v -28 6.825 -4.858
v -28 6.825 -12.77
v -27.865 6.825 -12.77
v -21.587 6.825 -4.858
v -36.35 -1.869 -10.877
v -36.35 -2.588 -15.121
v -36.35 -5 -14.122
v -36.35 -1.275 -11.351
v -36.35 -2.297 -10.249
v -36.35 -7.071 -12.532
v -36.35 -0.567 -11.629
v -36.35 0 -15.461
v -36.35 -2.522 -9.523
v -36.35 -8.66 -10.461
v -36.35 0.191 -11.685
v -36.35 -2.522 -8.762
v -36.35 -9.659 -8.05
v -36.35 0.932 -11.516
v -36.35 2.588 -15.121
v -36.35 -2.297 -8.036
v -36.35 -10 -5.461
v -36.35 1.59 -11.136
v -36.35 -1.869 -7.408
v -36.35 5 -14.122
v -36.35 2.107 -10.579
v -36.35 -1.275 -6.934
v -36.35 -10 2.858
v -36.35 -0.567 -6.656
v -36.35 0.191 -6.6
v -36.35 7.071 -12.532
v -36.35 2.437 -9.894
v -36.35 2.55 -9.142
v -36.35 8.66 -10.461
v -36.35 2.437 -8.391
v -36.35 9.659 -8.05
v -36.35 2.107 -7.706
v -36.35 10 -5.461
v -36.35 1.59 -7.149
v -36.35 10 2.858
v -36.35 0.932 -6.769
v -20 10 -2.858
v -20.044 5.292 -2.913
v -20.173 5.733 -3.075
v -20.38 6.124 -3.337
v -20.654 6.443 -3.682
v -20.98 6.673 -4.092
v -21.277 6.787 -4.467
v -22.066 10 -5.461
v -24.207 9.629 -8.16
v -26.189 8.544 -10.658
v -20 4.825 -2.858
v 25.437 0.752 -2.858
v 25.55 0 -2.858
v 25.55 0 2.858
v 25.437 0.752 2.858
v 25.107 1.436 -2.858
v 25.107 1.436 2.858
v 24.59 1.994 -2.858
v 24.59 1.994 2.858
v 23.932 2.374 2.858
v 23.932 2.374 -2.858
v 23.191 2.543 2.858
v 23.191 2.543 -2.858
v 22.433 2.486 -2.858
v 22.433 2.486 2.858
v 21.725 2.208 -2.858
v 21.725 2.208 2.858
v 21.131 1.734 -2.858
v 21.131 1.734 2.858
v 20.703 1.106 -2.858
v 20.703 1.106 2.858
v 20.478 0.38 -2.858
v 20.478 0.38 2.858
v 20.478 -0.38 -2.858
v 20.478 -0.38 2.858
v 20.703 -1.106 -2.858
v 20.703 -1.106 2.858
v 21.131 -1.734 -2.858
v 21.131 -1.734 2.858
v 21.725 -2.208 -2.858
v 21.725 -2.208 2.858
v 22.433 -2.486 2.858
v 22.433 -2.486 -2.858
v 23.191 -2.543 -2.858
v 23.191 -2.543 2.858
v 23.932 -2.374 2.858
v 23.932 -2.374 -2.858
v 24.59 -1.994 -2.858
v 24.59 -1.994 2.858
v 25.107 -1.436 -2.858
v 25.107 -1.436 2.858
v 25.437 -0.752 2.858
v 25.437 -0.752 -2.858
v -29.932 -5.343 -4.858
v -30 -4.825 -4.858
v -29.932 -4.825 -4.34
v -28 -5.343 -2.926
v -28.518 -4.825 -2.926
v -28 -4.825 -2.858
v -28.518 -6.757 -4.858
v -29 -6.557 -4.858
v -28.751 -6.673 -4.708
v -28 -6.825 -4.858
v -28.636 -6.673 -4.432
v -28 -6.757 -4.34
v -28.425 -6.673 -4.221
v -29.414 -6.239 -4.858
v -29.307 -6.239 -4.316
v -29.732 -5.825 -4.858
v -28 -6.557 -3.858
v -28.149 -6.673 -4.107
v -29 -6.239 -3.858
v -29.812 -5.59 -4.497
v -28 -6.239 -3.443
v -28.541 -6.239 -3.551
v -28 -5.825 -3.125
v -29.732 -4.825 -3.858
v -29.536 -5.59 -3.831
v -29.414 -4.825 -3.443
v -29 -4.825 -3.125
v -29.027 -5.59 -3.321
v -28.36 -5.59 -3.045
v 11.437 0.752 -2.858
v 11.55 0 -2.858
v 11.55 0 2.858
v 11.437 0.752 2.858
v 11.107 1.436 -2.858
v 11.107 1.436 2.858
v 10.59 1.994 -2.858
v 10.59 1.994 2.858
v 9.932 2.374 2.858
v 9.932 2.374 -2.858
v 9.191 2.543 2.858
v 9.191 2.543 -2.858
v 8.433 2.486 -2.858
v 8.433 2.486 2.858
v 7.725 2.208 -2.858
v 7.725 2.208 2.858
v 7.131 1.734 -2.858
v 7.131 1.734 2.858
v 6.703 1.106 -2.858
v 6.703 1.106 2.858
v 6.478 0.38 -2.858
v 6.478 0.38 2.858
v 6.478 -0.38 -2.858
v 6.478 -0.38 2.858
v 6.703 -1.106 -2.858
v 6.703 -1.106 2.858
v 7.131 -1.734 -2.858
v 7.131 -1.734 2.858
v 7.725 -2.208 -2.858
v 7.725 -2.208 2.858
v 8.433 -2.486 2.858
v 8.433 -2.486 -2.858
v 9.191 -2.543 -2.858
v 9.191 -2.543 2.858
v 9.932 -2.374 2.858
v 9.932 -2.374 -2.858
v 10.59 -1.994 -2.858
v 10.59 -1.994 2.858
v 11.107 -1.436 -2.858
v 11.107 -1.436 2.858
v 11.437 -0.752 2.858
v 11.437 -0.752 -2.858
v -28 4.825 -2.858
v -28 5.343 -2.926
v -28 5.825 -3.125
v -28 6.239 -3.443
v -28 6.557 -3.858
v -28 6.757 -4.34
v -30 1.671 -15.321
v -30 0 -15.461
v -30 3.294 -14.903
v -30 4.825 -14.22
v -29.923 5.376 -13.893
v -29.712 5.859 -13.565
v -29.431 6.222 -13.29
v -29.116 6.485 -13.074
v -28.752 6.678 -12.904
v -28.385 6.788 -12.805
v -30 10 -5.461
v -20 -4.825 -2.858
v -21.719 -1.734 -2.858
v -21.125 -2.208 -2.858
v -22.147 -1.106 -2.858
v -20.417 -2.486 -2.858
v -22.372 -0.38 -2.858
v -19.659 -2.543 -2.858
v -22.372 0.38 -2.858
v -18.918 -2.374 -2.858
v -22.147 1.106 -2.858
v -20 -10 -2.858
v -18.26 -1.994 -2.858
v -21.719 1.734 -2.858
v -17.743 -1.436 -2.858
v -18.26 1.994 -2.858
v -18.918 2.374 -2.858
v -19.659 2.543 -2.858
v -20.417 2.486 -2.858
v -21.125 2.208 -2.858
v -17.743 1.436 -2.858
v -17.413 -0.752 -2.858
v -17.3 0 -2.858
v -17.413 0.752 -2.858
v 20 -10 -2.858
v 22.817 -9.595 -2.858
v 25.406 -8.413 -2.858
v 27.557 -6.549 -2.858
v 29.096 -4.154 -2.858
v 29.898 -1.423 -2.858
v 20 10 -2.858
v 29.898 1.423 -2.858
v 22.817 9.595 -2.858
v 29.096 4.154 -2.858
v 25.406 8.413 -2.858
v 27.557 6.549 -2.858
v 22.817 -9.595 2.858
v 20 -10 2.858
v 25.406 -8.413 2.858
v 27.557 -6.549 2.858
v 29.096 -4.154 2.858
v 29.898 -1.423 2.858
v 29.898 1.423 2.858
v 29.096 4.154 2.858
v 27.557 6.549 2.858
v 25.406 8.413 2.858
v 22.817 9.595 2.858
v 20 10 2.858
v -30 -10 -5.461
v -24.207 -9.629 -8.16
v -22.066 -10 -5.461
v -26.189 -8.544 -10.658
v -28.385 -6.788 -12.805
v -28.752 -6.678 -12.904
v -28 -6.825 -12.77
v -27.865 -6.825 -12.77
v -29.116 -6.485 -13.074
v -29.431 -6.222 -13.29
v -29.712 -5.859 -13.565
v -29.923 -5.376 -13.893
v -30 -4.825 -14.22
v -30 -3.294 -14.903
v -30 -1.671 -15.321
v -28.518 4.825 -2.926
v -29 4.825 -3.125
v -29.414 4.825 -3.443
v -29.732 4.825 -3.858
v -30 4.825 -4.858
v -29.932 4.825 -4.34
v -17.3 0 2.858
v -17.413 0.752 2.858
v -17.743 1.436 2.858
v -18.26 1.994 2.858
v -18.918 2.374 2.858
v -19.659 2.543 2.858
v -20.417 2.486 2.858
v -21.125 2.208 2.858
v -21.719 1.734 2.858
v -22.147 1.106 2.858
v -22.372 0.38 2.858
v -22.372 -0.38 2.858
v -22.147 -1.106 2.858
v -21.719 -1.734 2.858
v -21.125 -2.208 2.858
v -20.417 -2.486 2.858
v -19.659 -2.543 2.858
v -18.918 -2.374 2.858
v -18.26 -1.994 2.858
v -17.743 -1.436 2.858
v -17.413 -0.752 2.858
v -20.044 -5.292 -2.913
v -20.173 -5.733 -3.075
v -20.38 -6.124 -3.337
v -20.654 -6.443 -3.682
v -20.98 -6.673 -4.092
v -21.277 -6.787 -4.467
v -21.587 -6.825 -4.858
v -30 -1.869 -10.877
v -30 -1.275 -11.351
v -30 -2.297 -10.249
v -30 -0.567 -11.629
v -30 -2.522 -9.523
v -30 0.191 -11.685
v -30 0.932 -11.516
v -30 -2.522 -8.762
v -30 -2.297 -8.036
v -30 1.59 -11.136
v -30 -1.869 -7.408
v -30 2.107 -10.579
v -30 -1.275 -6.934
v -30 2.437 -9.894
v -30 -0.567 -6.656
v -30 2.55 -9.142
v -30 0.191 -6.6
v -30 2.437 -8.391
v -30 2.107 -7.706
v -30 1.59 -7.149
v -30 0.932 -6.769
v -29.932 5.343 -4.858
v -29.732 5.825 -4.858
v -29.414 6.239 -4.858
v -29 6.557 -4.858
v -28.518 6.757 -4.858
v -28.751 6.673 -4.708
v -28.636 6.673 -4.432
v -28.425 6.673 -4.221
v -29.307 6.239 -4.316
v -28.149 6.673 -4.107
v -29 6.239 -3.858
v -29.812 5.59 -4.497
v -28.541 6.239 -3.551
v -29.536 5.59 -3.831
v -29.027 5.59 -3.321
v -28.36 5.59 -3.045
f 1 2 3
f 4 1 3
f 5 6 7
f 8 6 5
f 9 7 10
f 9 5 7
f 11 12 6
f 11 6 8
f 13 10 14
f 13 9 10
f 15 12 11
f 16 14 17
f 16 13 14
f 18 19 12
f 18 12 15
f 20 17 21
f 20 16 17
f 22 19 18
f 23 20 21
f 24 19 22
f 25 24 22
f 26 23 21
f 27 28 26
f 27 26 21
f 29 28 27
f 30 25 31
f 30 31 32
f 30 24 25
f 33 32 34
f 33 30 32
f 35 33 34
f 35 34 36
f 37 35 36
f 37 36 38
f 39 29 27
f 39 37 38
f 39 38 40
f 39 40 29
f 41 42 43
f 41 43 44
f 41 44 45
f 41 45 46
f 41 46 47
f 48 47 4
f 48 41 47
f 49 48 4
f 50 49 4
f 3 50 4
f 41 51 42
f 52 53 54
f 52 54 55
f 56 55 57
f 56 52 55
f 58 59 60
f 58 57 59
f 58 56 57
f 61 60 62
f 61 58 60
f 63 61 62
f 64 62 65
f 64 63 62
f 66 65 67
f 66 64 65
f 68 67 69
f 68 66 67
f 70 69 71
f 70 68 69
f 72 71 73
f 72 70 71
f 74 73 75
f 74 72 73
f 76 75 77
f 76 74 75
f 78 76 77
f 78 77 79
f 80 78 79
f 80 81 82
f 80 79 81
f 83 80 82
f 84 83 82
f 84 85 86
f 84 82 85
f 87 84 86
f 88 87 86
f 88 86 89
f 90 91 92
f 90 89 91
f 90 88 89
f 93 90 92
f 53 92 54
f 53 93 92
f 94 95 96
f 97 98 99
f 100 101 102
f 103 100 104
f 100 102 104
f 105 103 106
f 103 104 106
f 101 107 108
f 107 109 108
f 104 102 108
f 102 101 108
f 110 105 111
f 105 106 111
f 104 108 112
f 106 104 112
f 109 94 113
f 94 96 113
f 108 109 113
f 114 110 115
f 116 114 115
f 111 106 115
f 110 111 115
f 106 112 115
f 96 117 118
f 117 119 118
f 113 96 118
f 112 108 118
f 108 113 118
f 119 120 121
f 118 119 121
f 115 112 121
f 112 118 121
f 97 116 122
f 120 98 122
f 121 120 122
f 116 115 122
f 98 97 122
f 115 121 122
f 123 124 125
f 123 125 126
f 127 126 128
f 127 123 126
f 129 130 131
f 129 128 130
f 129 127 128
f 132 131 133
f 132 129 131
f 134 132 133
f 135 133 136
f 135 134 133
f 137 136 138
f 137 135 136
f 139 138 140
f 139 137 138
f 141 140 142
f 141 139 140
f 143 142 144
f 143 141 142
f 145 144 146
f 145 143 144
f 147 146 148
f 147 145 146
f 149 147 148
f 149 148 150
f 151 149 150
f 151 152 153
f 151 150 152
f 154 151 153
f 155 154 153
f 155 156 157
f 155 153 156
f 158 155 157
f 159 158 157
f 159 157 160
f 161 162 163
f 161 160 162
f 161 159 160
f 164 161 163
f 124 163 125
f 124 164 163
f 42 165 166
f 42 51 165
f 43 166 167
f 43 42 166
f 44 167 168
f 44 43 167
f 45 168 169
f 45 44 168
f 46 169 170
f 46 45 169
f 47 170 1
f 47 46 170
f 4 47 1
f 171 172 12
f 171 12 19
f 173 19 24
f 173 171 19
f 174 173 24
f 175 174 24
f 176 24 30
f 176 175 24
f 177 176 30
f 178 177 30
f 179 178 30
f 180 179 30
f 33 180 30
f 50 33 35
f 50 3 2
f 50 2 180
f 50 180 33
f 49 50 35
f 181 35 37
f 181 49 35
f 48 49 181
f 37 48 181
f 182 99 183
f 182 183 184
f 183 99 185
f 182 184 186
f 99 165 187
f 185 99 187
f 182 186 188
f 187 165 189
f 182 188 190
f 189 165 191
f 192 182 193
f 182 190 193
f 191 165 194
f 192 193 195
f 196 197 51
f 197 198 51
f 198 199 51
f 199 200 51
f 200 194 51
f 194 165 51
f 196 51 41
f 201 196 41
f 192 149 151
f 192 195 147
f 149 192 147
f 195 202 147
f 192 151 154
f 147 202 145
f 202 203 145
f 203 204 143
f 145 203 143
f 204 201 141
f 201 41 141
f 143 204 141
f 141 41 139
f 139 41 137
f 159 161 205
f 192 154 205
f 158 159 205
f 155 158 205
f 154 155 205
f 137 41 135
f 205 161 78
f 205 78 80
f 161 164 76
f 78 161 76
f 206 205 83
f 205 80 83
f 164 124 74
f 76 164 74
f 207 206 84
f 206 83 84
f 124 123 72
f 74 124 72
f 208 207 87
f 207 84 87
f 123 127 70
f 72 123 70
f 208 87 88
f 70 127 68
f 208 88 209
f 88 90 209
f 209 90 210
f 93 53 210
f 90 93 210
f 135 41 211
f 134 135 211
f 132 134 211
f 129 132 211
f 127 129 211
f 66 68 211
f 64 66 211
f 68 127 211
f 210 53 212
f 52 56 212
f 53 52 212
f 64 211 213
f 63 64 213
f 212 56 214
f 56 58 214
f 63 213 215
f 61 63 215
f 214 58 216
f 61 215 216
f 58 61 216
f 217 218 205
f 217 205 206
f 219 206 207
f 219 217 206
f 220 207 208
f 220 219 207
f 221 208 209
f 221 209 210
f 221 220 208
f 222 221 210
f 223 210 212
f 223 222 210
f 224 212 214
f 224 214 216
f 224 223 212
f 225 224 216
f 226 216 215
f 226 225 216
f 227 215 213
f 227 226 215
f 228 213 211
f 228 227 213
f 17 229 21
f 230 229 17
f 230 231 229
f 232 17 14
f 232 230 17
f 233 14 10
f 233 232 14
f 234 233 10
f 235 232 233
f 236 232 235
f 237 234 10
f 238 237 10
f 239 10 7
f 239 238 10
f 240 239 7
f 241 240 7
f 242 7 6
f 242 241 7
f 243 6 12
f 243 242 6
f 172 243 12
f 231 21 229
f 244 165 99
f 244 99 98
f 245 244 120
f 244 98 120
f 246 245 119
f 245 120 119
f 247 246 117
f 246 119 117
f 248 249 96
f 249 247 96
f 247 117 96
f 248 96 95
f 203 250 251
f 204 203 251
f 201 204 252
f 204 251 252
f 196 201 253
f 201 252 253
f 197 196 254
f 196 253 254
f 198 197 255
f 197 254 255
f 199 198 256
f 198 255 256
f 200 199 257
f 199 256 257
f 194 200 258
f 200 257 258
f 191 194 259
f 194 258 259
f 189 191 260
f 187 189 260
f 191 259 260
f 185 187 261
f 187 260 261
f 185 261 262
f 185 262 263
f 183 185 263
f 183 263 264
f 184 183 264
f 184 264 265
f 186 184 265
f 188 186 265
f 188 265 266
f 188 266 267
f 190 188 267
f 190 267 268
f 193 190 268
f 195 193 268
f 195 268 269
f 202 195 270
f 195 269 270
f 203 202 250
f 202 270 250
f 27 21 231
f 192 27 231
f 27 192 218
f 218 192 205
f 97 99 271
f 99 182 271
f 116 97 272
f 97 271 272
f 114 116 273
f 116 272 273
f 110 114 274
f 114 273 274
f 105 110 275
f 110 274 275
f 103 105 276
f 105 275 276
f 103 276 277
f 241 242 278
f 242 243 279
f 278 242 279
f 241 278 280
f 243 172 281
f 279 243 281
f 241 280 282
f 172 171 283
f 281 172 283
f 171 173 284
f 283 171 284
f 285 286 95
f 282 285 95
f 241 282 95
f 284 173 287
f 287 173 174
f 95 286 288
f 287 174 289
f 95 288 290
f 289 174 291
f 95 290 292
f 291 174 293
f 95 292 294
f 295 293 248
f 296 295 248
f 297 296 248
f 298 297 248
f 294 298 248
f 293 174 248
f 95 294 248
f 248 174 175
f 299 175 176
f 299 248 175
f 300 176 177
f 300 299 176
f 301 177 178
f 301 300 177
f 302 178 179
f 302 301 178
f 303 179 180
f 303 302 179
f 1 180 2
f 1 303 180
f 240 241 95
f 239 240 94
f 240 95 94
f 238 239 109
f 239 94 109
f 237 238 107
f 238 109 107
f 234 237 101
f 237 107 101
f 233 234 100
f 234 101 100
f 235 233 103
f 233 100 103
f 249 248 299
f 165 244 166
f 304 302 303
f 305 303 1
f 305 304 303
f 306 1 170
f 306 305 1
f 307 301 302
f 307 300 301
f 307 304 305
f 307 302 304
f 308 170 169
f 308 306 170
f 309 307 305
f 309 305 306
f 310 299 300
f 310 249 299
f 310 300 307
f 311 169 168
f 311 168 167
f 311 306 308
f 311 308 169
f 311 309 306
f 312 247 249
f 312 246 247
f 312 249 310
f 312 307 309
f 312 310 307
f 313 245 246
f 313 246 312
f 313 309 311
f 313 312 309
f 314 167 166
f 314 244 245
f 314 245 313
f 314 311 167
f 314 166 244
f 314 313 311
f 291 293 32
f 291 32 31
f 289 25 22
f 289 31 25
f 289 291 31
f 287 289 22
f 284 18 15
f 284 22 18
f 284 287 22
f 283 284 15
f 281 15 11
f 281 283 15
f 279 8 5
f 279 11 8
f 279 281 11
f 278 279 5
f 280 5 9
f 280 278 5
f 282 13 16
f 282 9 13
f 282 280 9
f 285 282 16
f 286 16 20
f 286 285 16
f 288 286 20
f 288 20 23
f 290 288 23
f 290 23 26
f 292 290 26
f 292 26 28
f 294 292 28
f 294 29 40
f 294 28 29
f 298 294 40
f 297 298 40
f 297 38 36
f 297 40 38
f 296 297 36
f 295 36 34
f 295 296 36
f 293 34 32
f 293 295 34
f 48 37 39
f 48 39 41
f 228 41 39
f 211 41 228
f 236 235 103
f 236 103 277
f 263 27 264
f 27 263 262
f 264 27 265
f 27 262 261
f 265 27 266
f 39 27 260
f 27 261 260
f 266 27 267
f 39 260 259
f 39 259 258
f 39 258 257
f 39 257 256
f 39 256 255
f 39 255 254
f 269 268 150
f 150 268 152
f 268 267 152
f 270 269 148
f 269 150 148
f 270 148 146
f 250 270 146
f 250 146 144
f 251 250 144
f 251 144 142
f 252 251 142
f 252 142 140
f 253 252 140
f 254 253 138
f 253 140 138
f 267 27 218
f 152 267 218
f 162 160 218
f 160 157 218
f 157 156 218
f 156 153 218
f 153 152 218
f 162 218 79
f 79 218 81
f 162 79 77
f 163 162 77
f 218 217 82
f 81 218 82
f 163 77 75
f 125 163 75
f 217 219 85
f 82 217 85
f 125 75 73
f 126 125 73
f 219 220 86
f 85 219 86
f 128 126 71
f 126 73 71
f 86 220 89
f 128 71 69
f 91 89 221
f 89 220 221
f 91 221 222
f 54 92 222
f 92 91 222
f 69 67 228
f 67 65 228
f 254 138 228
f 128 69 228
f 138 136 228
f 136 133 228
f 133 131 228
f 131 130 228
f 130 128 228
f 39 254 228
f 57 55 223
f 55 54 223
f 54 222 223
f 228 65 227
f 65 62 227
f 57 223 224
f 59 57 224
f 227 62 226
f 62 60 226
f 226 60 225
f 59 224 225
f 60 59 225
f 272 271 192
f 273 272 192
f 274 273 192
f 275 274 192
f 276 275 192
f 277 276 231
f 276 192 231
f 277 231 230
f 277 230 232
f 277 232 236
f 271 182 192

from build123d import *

# Parameters (mm, degrees)
BOSS_EXTRUDE1_DEPTH     = 2.8575
CUT_EXTRUDE1_DEPTH      = 33.135046678
CUT_EXTRUDE1_DEPTH_BACK = 33.135046678
SKETCH3_R               = 2.55
SKETCH4_R               = 2.55
CUT_EXTRUDE2_DEPTH      = 5.715
SKETCH5_W               = 18.318839082
SKETCH5_H               = 20
BOSS_EXTRUDE2_DEPTH     = 6.35
FILLET1_R               = 10
CUT_EXTRUDE3_DEPTH      = 69.857646679
CUT_EXTRUDE3_DEPTH_BACK = 69.857646679
SKETCH6_R               = 2.55
BOSS_EXTRUDE3_DEPTH     = 3.175
CUT_EXTRUDE4_DEPTH      = 69.857646679
CUT_EXTRUDE4_DEPTH_BACK = 69.857646679
FILLET2_R               = 2


with BuildPart() as part:
    # Sketch2 → Boss-Extrude1 (new, symmetric)
    with BuildSketch(Plane.XY):
        with BuildLine():
            Line((-30, 10), (-30, -10))
            Line((-30, -10), (20, -10))
            ThreePointArc((20, -10), (30, 0), (20, 10))
            Line((20, 10), (-30, 10))
        make_face()
    extrude(amount=BOSS_EXTRUDE1_DEPTH, both=True)

    # Sketch3 → Cut-Extrude1 (cut, two sides: drawn at the far end of the back side and taken through both)
    with BuildSketch(Plane.XY.offset(2.8575).offset(-CUT_EXTRUDE1_DEPTH_BACK)):
        with Locations((9, 0)):
            Circle(SKETCH3_R)
        with Locations((23, 0)):
            Circle(SKETCH3_R)
    extrude(amount=CUT_EXTRUDE1_DEPTH + CUT_EXTRUDE1_DEPTH_BACK, mode=Mode.SUBTRACT)

    # Sketch4 → Cut-Extrude2 (cut)
    with BuildSketch(Plane.XY.offset(2.8575)):
        with Locations((-19.85, 0)):
            Circle(SKETCH4_R)
    extrude(amount=-CUT_EXTRUDE2_DEPTH, mode=Mode.SUBTRACT)

    # Sketch5 → Boss-Extrude2 (add)
    with BuildSketch(Plane.ZY.offset(30)):
        with Locations((-6.301919541, 0)):
            Rectangle(SKETCH5_W, SKETCH5_H)
    extrude(amount=BOSS_EXTRUDE2_DEPTH)

    # Fillet1
    fillet1_edges = [part.edges().sort_by_distance(p)[0] for p in [
        (-33.175, -10, -15.461339082),
        (-33.175, 10, -15.461339082),
    ]]
    fillet(fillet1_edges, radius=FILLET1_R - 0.0001)  # a hair under: the kernel refuses the full size

    # Sketch6 → Cut-Extrude3 (cut, two sides: drawn at the far end of the back side and taken through both)
    with BuildSketch(Plane.ZY.offset(36.35).offset(-CUT_EXTRUDE3_DEPTH_BACK)):
        with Locations(Location((-9.1425, 0, 0), (0, 0, 90))):
            Circle(SKETCH6_R)
    extrude(amount=CUT_EXTRUDE3_DEPTH + CUT_EXTRUDE3_DEPTH_BACK, mode=Mode.SUBTRACT)

    # Sketch7 → Boss-Extrude3 (add)
    with BuildSketch(Plane(origin=(0, 10, 0), x_dir=(1, 0, 0), z_dir=(0, 1, 0))):
        Polygon((-30, 2.8575), (-20, 2.8575), (-30, 15.461339082), (-30, 5.461339082), align=None)
    boss_extrude3 = extrude(amount=-BOSS_EXTRUDE3_DEPTH)

    # Mirror1: Boss-Extrude3 across plane
    add(boss_extrude3.mirror(Plane.ZX))

    # Sketch8 → Cut-Extrude4 (cut, two sides: drawn at the far end of the back side and taken through both)
    with BuildSketch(Plane.ZY.offset(36.35).offset(-CUT_EXTRUDE4_DEPTH_BACK)):
        with BuildLine():
            ThreePointArc((-15.461339082, 0), (-12.532406894, 7.071067812), (-5.461339082, 10))
            Line((-5.461339082, 10), (-15.461339082, 10))
            Line((-15.461339082, 10), (-15.461339082, 0))
        make_face()
        with BuildLine():
            Line((-15.461339082, -10), (-5.461339082, -10))
            ThreePointArc((-5.461339082, -10), (-12.532406894, -7.071067812), (-15.461339082, 0))
            Line((-15.461339082, 0), (-15.461339082, -10))
        make_face()
    extrude(amount=CUT_EXTRUDE4_DEPTH + CUT_EXTRUDE4_DEPTH_BACK, mode=Mode.SUBTRACT)

    # Fillet2
    fillet2_edges = [part.edges().sort_by_distance(p)[0] for p in [
        (-30, 0, -2.8575),
        (-30, 6.825, -7.813847506),
        (-25, 6.825, -2.8575),
        (-30, -6.825, -7.813847506),
        (-25, -6.825, -2.8575),
    ]]
    fillet(fillet2_edges, radius=FILLET2_R)


solid = part.part
